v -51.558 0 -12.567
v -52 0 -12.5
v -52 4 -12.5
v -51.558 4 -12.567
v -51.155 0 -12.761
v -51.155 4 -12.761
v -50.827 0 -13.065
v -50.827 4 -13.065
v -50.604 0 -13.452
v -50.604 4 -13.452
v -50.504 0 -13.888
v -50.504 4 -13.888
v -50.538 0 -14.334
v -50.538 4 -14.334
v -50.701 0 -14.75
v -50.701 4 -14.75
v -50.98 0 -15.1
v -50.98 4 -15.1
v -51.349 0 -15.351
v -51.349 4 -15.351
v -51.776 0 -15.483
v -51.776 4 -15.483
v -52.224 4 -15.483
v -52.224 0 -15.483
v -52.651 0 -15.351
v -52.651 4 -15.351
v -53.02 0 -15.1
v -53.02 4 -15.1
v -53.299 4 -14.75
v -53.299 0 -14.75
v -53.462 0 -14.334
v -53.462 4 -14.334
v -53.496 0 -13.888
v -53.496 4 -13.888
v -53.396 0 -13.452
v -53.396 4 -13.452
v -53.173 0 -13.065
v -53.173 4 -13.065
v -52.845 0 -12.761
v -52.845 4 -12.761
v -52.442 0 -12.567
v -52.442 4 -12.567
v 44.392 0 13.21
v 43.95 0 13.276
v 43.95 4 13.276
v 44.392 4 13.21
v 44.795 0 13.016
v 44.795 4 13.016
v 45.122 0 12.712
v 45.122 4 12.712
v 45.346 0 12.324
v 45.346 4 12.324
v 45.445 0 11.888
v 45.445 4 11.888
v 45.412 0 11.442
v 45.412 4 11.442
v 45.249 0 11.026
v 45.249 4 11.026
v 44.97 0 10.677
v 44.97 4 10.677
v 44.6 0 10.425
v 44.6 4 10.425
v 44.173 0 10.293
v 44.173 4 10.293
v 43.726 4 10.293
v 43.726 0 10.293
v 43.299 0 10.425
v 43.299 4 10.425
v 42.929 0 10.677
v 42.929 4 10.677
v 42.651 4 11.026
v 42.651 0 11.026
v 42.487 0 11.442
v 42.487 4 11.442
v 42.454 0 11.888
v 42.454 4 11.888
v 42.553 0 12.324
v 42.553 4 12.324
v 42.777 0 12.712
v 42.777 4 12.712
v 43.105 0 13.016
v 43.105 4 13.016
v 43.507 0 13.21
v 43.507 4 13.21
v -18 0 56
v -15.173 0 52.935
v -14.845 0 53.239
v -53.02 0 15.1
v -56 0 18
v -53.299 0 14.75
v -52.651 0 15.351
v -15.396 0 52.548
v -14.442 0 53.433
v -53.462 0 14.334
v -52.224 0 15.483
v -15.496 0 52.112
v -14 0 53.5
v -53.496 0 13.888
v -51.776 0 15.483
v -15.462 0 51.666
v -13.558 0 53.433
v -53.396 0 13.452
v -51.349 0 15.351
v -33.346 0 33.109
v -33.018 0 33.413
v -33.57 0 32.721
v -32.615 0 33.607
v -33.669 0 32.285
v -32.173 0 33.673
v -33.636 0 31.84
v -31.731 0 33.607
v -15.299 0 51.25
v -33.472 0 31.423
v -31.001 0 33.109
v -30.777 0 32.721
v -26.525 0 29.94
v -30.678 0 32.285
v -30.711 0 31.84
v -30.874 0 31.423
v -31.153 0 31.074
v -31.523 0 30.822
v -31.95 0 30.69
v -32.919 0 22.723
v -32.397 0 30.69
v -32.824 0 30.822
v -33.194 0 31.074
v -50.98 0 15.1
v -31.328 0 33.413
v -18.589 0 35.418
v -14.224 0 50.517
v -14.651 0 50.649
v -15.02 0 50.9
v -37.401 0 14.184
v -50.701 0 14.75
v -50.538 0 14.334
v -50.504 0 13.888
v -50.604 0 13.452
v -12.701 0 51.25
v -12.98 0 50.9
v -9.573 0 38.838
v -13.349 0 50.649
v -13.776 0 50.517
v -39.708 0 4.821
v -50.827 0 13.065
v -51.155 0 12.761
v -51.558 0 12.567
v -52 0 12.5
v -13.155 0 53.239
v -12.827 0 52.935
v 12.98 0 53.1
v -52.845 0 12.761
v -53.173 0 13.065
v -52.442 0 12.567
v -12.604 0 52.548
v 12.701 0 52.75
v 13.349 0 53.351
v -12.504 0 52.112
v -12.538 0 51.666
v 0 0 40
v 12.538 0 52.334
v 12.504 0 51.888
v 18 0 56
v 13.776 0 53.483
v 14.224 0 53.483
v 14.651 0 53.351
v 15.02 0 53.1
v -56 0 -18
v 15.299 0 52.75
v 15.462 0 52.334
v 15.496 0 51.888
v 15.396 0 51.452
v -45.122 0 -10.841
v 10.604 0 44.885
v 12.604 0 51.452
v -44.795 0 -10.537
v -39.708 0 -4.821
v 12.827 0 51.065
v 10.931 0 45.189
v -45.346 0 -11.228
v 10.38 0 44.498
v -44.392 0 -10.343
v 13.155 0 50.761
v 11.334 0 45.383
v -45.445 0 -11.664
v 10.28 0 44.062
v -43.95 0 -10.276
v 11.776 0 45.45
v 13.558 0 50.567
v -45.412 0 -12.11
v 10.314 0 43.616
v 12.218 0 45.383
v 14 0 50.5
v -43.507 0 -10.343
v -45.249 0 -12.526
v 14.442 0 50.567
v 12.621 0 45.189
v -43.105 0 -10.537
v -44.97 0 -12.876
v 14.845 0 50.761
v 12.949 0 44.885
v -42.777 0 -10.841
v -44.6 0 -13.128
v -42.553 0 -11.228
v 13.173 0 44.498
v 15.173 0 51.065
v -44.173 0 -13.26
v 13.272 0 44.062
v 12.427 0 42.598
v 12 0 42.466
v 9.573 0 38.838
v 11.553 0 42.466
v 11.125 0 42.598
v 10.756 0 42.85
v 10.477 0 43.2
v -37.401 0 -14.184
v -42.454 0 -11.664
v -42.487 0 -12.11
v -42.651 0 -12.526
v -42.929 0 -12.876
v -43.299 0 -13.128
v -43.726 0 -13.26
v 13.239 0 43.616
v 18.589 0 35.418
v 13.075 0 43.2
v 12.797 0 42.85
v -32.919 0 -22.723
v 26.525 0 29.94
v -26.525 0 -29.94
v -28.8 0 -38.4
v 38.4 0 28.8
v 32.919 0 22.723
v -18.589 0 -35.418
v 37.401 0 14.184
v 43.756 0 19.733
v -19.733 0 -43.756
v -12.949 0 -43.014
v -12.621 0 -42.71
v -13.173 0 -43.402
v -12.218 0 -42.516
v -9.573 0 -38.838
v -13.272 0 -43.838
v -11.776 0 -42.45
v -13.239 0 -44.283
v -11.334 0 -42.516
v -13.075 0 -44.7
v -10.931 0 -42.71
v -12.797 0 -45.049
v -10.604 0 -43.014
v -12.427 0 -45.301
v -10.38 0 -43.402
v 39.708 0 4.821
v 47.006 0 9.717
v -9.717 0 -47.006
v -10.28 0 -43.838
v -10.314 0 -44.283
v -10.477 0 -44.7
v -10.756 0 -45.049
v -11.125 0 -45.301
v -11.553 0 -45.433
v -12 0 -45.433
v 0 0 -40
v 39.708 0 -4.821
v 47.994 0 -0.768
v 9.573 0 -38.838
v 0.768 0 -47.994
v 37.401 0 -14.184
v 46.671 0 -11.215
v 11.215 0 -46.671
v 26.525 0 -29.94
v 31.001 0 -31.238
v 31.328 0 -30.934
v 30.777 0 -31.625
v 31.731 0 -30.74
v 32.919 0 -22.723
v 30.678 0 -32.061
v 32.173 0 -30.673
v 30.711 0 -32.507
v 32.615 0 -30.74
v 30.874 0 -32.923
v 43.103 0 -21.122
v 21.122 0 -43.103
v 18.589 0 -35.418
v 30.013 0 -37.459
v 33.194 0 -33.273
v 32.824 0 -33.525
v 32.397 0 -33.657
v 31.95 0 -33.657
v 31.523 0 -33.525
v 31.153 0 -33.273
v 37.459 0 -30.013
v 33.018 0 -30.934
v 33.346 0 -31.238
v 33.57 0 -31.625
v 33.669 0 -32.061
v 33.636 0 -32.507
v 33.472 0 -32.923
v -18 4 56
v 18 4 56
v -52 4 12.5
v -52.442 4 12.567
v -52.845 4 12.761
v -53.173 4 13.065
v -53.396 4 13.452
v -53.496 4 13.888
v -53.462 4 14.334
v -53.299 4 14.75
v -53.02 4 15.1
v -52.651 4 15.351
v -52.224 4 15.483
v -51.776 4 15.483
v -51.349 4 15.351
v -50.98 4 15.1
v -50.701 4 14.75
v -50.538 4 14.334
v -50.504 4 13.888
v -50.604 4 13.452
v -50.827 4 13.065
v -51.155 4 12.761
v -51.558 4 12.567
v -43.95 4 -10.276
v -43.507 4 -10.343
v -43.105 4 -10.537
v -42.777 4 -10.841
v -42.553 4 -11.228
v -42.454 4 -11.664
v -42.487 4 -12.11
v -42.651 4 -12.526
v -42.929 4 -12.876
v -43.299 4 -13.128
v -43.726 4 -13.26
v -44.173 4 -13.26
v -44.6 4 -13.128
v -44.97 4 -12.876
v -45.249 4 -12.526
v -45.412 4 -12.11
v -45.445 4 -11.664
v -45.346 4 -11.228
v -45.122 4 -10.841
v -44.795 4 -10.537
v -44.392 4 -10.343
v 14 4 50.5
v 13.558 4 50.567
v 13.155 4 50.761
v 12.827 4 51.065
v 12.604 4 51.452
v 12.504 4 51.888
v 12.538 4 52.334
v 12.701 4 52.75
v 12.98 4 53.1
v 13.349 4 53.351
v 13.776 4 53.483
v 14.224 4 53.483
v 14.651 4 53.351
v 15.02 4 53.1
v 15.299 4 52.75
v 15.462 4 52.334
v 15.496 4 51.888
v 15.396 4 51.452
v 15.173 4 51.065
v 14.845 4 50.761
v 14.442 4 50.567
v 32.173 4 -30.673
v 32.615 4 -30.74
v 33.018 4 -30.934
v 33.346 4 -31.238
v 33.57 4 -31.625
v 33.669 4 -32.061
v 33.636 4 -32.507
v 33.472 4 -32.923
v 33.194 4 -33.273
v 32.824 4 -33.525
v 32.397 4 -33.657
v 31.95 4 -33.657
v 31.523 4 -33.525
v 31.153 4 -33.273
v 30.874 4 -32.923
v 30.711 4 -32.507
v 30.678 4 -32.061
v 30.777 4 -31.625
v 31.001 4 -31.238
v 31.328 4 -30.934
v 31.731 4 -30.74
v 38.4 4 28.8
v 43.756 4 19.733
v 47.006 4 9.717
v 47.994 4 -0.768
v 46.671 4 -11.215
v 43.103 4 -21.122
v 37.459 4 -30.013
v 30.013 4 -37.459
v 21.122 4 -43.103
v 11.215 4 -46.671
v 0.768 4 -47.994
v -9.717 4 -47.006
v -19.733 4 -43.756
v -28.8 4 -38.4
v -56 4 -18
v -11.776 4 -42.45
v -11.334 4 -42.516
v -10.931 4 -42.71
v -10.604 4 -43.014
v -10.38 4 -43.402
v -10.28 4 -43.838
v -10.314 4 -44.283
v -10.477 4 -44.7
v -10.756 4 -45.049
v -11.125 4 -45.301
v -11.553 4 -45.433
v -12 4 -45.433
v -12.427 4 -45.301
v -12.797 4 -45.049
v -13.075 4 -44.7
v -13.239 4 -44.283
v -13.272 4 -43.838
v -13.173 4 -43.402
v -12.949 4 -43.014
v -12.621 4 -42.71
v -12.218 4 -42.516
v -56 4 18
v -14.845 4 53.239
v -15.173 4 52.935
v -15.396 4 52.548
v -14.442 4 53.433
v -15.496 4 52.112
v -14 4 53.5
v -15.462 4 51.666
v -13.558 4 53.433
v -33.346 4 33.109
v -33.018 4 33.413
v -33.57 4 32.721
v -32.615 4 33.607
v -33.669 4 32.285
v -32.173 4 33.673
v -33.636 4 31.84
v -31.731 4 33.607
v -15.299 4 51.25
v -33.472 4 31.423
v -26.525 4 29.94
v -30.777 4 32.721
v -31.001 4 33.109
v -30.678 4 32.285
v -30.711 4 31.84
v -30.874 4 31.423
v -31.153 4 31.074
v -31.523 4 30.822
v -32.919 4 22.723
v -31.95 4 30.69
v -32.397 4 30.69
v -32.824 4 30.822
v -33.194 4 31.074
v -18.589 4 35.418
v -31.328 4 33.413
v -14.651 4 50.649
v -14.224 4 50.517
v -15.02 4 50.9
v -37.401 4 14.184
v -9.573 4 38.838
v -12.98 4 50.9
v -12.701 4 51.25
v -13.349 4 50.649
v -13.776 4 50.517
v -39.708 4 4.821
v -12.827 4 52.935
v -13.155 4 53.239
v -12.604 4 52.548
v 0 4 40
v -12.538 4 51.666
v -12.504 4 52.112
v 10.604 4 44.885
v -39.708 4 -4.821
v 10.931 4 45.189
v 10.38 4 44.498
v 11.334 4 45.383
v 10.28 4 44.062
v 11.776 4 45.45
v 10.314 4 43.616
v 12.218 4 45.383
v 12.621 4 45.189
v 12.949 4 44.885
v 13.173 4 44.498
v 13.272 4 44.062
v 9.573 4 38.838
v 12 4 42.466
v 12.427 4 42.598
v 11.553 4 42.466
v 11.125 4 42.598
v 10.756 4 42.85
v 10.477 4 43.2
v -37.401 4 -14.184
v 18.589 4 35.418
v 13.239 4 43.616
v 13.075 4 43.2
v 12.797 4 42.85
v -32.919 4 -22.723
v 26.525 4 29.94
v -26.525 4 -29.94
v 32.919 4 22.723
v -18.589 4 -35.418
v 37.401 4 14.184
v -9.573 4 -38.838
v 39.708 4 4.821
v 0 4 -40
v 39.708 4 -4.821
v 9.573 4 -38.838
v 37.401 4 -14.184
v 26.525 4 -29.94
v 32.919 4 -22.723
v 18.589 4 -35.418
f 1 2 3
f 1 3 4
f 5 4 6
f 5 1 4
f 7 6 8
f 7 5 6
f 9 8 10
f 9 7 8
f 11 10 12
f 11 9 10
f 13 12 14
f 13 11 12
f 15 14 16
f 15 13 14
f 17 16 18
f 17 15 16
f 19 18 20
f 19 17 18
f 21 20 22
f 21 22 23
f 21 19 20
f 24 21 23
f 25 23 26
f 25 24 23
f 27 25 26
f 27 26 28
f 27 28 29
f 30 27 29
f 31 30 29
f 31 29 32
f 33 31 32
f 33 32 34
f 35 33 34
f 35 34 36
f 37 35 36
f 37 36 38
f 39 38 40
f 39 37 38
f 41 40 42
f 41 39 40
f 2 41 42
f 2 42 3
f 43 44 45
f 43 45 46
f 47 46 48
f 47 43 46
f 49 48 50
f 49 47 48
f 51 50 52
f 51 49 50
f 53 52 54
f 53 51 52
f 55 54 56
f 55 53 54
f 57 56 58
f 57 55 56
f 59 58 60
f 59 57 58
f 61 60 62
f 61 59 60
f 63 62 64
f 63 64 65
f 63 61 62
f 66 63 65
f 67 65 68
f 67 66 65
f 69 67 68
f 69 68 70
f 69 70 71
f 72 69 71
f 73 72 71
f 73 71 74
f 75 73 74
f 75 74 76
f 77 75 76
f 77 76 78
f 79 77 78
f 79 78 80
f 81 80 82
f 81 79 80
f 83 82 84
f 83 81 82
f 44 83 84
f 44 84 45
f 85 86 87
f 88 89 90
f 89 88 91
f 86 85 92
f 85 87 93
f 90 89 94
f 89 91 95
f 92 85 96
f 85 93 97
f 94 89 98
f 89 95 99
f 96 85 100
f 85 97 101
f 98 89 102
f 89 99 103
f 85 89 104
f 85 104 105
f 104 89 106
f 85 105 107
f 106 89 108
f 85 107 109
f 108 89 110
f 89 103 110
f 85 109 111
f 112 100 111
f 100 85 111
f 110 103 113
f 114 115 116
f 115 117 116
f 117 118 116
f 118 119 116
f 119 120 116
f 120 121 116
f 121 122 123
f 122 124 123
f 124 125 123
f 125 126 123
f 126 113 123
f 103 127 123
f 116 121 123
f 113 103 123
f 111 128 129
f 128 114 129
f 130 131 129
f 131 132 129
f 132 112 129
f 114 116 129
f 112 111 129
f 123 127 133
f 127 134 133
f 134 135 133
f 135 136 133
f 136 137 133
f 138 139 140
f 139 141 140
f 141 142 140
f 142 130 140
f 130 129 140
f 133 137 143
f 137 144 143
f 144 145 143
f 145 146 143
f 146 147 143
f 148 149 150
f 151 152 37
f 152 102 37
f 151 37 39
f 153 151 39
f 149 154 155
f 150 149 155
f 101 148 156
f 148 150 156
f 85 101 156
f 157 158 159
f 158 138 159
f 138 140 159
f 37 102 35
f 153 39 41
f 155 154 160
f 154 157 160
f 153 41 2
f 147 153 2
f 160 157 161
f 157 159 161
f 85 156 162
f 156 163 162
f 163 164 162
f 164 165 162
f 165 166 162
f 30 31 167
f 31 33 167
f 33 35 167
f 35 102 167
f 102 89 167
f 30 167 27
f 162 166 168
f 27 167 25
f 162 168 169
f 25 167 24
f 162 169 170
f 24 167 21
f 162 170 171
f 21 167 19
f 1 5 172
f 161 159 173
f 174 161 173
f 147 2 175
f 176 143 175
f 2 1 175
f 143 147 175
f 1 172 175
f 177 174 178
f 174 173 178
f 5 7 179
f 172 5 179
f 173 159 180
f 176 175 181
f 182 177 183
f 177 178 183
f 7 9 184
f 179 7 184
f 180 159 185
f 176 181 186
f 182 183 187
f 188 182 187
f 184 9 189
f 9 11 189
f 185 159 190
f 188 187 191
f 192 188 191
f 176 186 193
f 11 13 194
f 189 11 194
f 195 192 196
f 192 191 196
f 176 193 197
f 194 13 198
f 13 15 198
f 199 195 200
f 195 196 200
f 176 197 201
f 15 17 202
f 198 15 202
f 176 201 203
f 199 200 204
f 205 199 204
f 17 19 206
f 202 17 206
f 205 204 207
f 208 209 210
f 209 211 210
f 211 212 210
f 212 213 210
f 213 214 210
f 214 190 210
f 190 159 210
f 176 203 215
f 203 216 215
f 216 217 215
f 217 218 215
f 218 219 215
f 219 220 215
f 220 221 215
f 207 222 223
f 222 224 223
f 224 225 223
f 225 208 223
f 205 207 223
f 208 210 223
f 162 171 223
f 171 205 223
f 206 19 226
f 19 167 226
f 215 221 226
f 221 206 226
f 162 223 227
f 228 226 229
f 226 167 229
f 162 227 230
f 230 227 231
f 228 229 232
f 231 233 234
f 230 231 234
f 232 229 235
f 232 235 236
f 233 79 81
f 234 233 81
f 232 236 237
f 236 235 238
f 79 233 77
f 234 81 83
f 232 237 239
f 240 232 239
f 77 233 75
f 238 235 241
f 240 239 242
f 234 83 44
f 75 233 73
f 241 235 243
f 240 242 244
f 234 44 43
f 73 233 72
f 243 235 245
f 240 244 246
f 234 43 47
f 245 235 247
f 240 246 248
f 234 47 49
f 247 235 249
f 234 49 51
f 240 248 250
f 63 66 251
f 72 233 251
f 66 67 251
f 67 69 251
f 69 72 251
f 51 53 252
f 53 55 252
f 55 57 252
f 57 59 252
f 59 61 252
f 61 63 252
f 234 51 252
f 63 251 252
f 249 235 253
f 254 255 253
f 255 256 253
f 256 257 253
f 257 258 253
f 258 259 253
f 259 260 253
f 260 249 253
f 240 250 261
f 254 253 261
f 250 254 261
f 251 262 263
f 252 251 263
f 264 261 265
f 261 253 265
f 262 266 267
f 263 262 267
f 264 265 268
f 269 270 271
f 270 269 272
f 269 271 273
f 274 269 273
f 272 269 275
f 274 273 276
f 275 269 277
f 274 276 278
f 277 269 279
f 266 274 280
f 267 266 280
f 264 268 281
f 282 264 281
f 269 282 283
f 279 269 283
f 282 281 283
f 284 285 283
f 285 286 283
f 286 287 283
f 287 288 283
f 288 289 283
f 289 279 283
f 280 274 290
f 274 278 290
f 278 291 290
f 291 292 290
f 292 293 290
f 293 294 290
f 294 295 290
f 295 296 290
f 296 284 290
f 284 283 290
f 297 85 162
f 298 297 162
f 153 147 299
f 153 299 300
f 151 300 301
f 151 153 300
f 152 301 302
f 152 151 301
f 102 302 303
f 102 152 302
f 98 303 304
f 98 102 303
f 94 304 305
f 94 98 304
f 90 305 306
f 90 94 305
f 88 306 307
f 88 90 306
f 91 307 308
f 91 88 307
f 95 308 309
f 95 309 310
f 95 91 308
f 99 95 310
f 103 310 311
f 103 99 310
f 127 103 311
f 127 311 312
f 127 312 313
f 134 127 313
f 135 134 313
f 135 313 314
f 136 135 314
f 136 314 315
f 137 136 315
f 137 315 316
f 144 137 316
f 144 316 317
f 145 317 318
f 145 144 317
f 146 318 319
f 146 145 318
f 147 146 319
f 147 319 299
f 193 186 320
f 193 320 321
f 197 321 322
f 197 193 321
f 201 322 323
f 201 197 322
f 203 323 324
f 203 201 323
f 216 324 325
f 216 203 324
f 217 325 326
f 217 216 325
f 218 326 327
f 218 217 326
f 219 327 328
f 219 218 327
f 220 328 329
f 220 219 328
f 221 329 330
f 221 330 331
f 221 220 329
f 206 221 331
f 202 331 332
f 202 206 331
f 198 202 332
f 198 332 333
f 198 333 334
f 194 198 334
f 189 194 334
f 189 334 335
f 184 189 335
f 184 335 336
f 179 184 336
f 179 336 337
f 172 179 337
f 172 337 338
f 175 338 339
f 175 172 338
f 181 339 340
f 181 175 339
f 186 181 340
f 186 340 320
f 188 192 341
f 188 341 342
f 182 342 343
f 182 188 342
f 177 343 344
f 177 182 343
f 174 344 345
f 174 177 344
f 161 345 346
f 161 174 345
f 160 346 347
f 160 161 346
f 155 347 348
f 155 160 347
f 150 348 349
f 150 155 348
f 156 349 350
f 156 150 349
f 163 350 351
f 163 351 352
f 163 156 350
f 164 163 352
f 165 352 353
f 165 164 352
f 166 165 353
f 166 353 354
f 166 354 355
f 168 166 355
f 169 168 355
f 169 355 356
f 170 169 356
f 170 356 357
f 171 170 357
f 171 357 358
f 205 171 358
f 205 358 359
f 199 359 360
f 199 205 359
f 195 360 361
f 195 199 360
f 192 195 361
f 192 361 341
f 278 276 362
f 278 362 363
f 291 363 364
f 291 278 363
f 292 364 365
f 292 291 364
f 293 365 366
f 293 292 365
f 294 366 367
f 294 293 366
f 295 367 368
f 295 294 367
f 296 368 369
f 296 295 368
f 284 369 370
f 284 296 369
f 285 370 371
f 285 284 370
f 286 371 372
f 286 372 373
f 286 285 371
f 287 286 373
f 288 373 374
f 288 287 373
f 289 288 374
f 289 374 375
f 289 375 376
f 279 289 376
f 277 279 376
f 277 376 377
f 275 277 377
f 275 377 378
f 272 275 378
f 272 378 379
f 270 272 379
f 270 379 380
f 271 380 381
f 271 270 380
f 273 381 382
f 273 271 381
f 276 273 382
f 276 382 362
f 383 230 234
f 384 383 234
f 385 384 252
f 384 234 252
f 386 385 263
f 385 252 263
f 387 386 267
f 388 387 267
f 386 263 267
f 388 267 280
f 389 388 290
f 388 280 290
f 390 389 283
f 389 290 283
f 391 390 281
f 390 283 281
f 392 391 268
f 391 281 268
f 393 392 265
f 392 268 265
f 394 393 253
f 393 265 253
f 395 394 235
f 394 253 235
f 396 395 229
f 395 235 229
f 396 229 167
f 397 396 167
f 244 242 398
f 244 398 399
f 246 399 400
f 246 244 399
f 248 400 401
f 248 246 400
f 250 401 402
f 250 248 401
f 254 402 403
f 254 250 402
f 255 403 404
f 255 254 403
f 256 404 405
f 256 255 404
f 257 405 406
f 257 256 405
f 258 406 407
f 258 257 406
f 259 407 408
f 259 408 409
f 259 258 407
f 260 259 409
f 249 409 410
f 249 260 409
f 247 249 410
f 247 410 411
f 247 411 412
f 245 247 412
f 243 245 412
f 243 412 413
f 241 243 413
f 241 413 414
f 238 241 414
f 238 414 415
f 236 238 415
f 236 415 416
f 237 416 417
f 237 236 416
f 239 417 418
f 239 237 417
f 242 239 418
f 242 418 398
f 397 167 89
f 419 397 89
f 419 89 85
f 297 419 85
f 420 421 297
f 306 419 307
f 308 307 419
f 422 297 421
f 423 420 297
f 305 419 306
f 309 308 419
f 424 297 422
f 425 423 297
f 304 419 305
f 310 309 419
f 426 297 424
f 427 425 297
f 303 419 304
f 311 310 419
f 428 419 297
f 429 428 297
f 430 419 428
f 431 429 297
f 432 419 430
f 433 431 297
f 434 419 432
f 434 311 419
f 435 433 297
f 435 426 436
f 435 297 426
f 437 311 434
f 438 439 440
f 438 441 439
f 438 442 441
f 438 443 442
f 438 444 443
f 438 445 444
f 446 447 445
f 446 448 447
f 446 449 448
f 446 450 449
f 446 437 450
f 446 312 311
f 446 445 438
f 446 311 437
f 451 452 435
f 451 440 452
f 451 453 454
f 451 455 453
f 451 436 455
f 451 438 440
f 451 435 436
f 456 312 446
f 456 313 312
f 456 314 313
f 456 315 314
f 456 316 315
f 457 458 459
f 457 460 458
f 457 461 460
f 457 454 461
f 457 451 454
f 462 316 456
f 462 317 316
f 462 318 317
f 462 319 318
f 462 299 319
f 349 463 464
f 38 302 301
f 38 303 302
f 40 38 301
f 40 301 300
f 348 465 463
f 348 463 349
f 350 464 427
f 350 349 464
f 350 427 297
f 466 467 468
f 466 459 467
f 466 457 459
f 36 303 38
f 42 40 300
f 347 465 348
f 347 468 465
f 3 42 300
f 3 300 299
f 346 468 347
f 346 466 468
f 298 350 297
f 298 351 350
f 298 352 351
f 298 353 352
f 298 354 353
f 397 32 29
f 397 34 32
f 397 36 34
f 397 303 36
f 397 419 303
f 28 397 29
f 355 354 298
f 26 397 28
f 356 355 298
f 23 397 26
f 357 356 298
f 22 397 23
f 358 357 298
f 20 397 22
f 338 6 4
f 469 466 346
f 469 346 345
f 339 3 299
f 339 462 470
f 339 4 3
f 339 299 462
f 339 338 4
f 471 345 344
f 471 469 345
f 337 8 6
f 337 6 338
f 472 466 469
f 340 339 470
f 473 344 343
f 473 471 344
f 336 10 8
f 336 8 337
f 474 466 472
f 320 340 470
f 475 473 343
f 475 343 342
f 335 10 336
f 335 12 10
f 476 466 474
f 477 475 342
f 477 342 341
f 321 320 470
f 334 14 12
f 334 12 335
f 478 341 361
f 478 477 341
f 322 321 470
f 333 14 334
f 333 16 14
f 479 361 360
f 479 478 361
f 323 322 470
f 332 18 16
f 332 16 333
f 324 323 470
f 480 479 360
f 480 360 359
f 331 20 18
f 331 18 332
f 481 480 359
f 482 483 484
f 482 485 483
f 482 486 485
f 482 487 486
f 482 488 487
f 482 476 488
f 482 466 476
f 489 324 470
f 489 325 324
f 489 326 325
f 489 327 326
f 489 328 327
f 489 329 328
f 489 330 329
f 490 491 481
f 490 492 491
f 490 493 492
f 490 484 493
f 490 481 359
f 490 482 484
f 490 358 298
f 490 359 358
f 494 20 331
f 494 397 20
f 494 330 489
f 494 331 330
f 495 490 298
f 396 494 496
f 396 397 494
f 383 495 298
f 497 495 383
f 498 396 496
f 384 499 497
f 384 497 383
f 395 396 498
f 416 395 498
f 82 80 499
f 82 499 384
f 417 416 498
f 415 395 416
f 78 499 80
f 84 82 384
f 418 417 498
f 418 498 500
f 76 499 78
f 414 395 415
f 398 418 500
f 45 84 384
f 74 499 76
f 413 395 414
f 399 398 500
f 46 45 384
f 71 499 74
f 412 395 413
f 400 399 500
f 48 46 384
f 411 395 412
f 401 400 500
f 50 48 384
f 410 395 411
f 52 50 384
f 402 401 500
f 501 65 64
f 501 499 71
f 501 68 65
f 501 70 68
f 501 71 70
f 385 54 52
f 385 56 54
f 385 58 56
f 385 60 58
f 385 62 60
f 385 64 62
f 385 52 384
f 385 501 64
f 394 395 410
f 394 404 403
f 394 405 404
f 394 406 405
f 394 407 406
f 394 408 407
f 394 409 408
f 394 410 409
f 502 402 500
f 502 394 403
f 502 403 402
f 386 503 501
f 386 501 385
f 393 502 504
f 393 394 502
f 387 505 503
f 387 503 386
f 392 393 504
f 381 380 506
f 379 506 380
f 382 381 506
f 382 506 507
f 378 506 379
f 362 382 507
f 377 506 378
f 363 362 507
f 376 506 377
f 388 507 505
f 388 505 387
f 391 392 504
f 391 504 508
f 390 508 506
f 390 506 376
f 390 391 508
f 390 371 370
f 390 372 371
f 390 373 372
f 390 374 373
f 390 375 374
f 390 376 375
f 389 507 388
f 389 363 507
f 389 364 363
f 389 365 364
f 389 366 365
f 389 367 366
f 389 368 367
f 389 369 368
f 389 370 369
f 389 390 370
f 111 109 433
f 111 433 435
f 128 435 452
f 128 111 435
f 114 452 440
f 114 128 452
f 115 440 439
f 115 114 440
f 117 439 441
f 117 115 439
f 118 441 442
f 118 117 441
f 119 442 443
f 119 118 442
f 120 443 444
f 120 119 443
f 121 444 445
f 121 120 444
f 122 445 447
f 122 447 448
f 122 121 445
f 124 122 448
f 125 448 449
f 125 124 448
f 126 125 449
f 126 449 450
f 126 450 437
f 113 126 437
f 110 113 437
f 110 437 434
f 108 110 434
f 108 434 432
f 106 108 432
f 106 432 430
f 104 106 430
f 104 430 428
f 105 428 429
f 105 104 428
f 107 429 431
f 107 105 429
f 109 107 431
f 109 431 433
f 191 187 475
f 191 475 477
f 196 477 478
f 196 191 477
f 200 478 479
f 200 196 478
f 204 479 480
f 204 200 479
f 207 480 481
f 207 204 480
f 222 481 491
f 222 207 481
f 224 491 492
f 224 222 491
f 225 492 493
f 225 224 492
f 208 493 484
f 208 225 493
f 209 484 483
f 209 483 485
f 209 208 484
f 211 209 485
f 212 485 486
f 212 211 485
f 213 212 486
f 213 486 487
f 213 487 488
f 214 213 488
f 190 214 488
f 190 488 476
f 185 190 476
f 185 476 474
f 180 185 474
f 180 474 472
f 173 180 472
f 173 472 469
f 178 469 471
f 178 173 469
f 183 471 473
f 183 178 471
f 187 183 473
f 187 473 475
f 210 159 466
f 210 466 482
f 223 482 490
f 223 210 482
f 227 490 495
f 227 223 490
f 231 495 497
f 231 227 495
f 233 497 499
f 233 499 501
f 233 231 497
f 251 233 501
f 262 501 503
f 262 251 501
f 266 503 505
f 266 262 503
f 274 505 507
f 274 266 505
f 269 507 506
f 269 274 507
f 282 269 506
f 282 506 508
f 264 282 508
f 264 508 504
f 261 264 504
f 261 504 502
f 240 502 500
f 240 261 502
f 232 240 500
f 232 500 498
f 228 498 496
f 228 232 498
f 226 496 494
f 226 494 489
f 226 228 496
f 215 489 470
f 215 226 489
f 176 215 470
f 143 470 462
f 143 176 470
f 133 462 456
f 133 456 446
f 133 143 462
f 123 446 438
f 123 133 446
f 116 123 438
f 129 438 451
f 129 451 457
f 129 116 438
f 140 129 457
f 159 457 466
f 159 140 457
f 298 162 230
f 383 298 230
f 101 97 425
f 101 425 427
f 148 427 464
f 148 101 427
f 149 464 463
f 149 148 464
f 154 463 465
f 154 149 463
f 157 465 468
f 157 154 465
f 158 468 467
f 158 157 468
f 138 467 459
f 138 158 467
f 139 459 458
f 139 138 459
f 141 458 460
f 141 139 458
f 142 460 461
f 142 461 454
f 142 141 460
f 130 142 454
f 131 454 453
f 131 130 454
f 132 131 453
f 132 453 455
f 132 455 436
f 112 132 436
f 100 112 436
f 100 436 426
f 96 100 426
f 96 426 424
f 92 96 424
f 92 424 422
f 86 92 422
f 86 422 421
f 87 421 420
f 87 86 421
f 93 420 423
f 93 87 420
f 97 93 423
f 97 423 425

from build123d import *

# Parameters (mm, degrees)
SKETCH_1_R      = 40
SKETCH_1_R_2    = 1.5
EXTRUDE_1_DEPTH = 4


with BuildPart() as part:
    # 草图1 → 凸台-拉伸1 (new body)
    with BuildSketch(Plane(origin=(0, 0, 0), x_dir=(1, 0, 0), z_dir=(0, 1, 0))):
        with BuildLine():
            Line((-56, 18), (-56, -18))
            Line((-56, -18), (-18, -56))
            Line((-18, -56), (18, -56))
            Line((18, -56), (38.4, -28.8))
            ThreePointArc((38.4, -28.8), (33.941125497, 33.941125497), (-28.8, 38.4))
            Line((-28.8, 38.4), (-56, 18))
        make_face()
        with Locations(Location((0, 0, 0), (0, 0, 270))):
            Circle(SKETCH_1_R, mode=Mode.SUBTRACT)
        with Locations(Location((32.173358544, 32.173358544, 0), (0, 0, 270))):
            Circle(SKETCH_1_R_2, mode=Mode.SUBTRACT)
        with Locations(Location((43.949625096, -11.776266552, 0), (0, 0, 270))):
            Circle(SKETCH_1_R_2, mode=Mode.SUBTRACT)
        with Locations(Location((11.776266552, -43.949625096, 0), (0, 0, 270))):
            Circle(SKETCH_1_R_2, mode=Mode.SUBTRACT)
        with Locations(Location((-32.173358544, -32.173358544, 0), (0, 0, 270))):
            Circle(SKETCH_1_R_2, mode=Mode.SUBTRACT)
        with Locations(Location((-43.949625096, 11.776266552, 0), (0, 0, 270))):
            Circle(SKETCH_1_R_2, mode=Mode.SUBTRACT)
        with Locations(Location((-11.776266552, 43.949625096, 0), (0, 0, 270))):
            Circle(SKETCH_1_R_2, mode=Mode.SUBTRACT)
        with Locations(Location((-14, -52, 0), (0, 0, 270))):
            Circle(SKETCH_1_R_2, mode=Mode.SUBTRACT)
        with Locations(Location((14, -52, 0), (0, 0, 90))):
            Circle(SKETCH_1_R_2, mode=Mode.SUBTRACT)
        with Locations(Location((-52, -14, 0), (0, 0, 90))):
            Circle(SKETCH_1_R_2, mode=Mode.SUBTRACT)
        with Locations(Location((-52, 14, 0), (0, 0, 270))):
            Circle(SKETCH_1_R_2, mode=Mode.SUBTRACT)
    extrude(amount=EXTRUDE_1_DEPTH)


solid = part.part
